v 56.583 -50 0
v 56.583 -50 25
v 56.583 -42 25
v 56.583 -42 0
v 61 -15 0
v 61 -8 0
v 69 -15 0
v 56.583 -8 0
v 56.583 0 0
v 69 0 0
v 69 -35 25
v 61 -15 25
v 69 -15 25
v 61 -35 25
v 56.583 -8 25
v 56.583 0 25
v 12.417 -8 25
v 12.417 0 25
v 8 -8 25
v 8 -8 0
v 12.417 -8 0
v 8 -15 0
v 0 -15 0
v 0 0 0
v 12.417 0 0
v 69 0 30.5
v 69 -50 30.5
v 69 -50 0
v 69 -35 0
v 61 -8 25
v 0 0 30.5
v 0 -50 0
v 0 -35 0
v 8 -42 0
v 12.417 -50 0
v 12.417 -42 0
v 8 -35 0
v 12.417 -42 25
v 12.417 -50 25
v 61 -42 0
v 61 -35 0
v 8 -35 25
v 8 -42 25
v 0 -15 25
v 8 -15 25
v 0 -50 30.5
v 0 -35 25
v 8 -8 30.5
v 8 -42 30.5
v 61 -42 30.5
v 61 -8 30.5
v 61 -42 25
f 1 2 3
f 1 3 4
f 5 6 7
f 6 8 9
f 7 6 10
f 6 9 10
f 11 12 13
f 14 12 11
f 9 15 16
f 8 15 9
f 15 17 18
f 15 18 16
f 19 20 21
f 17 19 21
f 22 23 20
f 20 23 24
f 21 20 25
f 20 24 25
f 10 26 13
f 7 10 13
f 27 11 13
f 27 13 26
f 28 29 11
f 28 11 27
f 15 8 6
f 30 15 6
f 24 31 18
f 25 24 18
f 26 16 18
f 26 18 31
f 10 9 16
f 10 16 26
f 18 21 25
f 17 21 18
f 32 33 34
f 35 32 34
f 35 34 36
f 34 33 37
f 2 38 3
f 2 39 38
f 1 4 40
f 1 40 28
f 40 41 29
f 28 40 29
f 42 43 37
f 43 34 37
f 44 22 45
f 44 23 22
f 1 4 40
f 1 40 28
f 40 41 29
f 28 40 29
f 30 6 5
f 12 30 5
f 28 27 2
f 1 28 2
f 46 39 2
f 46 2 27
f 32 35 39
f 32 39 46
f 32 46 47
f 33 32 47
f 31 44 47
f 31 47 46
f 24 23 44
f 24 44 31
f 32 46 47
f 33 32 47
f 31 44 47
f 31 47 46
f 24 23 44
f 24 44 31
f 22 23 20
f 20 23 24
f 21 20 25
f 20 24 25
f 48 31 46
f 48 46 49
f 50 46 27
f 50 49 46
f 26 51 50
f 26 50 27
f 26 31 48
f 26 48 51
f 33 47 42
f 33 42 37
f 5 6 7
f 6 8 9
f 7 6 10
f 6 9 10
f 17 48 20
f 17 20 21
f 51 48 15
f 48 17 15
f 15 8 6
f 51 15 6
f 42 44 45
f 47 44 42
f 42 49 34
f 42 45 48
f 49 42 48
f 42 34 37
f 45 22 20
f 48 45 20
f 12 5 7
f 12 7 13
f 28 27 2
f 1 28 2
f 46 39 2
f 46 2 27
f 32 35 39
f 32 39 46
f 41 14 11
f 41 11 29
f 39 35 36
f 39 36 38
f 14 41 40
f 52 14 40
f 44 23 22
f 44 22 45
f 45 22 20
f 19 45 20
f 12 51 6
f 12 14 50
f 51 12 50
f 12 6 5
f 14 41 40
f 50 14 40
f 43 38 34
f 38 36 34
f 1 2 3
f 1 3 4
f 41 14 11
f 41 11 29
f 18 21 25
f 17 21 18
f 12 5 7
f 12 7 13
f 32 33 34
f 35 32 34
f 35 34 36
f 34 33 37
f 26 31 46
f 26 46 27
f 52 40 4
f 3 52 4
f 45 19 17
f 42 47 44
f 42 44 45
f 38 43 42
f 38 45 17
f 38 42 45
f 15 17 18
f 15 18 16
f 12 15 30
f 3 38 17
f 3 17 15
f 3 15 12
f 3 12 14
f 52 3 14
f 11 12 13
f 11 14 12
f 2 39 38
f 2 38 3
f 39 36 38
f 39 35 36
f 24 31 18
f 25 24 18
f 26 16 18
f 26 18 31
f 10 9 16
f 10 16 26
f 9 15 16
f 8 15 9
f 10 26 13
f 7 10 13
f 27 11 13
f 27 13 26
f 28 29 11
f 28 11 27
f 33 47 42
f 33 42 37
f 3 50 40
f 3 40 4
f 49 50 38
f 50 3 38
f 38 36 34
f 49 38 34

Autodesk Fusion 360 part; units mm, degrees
sketch "Sketch1" plane through (0, 0, 0) normal (0, 0, 1) x (1, 0, 0)
  line L0 (0, 0) -> (69, 0)
  line L1 (69, 0) -> (69, -50)
  line L2 (69, -50) -> (0, -50)
  line L3 (0, -50) -> (0, 0)
  line L4 (8, -8) -> (61, -8)
  line L5 (61, -8) -> (61, -42)
  line L6 (61, -42) -> (8, -42)
  line L7 (8, -42) -> (8, -8)
  dimension "d7" = 69
  dimension "d8" = 50
  dimension "d15" = 34
  dimension "d16" = 53
  dimension "d17" = 8
  dimension "d18" = 8
extrude "Extrude2" add sketch "Sketch1" along normal blind 30.5 makes body 1
extrude "Extrude1" add sketch "Sketch1" along normal blind 30.5 separate body contours L0 L1 L2 L3 | L4 L5 L6 L7 makes body 2
extrude "Extrude3" cut sketch "Sketch1" along normal blind 25 contours L4 L5 L6 L7 bodies 2
sketch "Sketch3" plane through (0, -50, 0) normal (0, -1, 0) x (1, 0, 0)
  line L0 (0, 0) -> (69, 0)
  line L1 (69, 0) -> (69, 30.5)
  line L2 (69, 30.5) -> (0, 30.5)
  line L3 (0, 30.5) -> (0, 0)
  line L4 (12.4167, 25) -> (56.5833, 25)
  line L5 (56.5833, 25) -> (56.5833, -5.5)
  line L6 (56.5833, -5.5) -> (12.4167, -5.5)
  line L7 (12.4167, -5.5) -> (12.4167, 25)
  dimension "d26" = 44.1667
  dimension "d27" = 30.5
  dimension "d28" = 5.5
  dimension "d32" = 12.4167
extrude "Extrude4" cut sketch "Sketch3" against normal blind 100 contours L0 L4 L5 L7 | L0 L5 L6 L7 bodies 1 2
sketch "Sketch4" plane through (0, 0, 0) normal (-1, 0, 0) x (0, -1, 0)
  line L0 (0, 0) -> (50, 0)
  line L1 (50, 0) -> (50, 30.5)
  line L2 (50, 30.5) -> (0, 30.5)
  line L3 (0, 30.5) -> (0, 0)
  line L4 (15, 25) -> (35, 25)
  line L5 (35, 25) -> (35, 0)
  line L6 (35, 0) -> (15, 0)
  line L7 (15, 0) -> (15, 25)
  line L8 (50, 0) -> (0, 0)
  line L9 (50, -5.5) -> (50, 25)
  dimension "d36" = 20
  dimension "d37" = 25
  dimension "d40" = 15
  dimension "d43" = 5.5
extrude "Extrude5" cut sketch "Sketch4" against normal blind 113 contours L0 L4 L5 L6 L7 L8 bodies 1 2
equation "bottom_thickness = 5.5 mm"
equation "side_thickness = 8 mm"
equation "outer_width = inner_width + 2 * side_thickness"
equation "height = 25 mm + bottom_thickness"
equation "outer_length = inner_length + 2 * side_thickness"
equation "inner_length = 53 mm"
equation "d7 = outer_length"
equation "d8 = outer_width"
equation "d9 = height"
equation "inner_width = 34 mm"
equation "d15 = inner_width"
equation "d16 = inner_length"
equation "d17 = side_thickness"
equation "d18 = side_thickness"
equation "d19 = height"
equation "d21 = height - bottom_thickness"
equation "big_side_gap = 5 * inner_length / 6"
equation "big_side_gap_distance = ( outer_length - big_side_gap ) / 2"
equation "extra = 100 mm"
equation "d26 = big_side_gap"
equation "d27 = height"
equation "d28 = bottom_thickness"
equation "d30 = -extra"
equation "d32 = big_side_gap_distance"
equation "small_side_gap_width = 25 mm"
equation "small_side_gap_length = 20 mm"
equation "small_side_gap_depth = side_thickness + 5 mm"
equation "d36 = small_side_gap_length"
equation "d37 = small_side_gap_width"
equation "small_side_gap_distance = ( outer_width - small_side_gap_length ) / 2"
equation "d40 = small_side_gap_distance"
equation "d41 = -small_side_gap_depth - 100 mm"
equation "d43 = bottom_thickness"
equation "cable_dent = 5 mm"
